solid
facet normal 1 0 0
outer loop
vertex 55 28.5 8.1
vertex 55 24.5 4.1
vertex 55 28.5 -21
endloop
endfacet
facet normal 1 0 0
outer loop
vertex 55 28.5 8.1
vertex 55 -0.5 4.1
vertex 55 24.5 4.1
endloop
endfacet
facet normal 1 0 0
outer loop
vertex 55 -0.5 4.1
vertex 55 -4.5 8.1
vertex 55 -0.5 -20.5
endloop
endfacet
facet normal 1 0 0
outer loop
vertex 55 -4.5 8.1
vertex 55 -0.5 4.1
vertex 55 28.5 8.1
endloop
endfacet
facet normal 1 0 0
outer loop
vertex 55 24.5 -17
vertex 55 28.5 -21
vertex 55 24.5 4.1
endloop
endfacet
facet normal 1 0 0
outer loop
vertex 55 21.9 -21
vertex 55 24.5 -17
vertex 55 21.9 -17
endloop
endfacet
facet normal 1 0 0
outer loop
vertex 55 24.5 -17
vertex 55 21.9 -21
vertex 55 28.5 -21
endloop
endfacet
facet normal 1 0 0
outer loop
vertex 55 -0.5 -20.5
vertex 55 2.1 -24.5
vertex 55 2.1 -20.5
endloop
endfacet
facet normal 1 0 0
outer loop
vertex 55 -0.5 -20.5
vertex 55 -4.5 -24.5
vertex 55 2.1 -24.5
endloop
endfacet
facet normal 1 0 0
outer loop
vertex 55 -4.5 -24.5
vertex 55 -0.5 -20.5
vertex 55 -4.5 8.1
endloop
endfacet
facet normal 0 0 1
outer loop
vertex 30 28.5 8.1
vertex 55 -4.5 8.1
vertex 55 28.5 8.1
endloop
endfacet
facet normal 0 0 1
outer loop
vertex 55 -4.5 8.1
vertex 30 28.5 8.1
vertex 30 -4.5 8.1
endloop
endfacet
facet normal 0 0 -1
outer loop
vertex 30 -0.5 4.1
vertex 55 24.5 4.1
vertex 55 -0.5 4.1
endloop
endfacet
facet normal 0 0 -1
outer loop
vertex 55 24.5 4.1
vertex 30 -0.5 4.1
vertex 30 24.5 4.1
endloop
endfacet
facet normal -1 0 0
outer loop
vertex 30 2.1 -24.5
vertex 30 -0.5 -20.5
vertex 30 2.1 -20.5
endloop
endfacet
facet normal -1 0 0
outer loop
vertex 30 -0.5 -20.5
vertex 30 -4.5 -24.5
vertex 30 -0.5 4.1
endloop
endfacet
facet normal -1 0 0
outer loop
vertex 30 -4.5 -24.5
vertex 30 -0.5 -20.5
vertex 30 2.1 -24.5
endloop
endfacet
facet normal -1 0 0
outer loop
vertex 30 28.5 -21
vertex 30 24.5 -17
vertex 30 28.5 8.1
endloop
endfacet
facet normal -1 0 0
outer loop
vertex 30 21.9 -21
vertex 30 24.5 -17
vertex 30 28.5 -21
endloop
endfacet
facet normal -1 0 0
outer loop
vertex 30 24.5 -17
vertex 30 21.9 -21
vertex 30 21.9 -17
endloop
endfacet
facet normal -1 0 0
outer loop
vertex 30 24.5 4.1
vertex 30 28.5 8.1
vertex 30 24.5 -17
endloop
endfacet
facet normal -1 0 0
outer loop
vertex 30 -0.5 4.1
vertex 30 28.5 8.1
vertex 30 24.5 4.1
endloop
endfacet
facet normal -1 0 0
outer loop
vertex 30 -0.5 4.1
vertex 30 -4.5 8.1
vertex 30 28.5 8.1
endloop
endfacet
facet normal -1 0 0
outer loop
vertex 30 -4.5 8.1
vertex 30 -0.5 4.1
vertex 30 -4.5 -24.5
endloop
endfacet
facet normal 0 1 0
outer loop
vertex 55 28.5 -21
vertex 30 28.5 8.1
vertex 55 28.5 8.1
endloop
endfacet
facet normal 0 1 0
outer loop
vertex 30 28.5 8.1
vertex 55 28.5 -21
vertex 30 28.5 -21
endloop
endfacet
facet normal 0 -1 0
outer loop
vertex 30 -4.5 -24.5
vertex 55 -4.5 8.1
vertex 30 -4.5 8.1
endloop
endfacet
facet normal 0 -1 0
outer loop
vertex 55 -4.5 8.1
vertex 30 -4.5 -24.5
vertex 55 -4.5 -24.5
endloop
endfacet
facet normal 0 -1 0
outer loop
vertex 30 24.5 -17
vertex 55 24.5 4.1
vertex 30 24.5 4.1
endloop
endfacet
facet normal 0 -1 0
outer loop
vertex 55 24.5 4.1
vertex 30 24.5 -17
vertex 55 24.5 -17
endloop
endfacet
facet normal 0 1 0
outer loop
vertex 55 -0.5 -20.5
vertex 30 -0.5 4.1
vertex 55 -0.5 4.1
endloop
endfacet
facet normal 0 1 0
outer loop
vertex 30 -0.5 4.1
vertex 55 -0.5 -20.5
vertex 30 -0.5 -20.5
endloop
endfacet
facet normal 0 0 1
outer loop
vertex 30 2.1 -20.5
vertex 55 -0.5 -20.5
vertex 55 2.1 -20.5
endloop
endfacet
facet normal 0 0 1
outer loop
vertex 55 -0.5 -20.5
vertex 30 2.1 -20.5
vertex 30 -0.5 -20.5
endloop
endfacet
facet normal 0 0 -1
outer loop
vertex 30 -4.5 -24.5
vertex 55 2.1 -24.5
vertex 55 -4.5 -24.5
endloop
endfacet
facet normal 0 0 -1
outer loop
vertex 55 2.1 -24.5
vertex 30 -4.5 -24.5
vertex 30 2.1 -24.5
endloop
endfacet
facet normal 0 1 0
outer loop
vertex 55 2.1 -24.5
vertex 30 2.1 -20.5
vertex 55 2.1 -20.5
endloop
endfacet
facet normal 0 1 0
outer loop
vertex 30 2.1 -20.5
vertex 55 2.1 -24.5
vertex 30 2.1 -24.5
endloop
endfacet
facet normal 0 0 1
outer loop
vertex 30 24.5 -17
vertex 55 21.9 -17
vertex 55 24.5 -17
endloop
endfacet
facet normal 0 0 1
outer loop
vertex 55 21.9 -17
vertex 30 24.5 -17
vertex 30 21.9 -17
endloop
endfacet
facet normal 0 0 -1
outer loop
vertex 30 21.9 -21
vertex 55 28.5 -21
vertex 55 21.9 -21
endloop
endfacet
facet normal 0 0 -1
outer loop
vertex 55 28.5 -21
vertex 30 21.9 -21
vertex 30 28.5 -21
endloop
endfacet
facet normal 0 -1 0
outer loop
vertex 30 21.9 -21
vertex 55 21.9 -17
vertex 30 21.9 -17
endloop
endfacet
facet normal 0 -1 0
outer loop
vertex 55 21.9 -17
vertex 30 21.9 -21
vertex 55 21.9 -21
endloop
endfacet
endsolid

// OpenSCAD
//###############################################################################
//# ScreenMount - Main Assembly                                                 #
//###############################################################################
//#    Copyright 2021 Dirk Heisswolf                                            #
//#    This file is part of the DiffCaSt project.                               #
//#                                                                             #
//#    This project is free software: you can redistribute it and/or modify     #
//#    it under the terms of the GNU General Public License as published by     #
//#    the Free Software Foundation, either version 3 of the License, or        #
//#    (at your option) any later version.                                      #
//#                                                                             #
//#    This project is distributed in the hope that it will be useful,          #
//#    but WITHOUT ANY WARRANTY; without even the implied warranty of           #
//#    MERCHANTABILITY or FITNESS FOR A PARTICULAR PURPOSE.  See the            #
//#    GNU General Public License for more details.                             #
//#                                                                             #
//#    You should have received a copy of the GNU General Public License        #
//#    along with this project.  If not, see <http://www.gnu.org/licenses/>.    #
//#                                                                             #
//#    This project makes use of the NopSCADlib library                         #
//#    (see https://github.com/nophead/NopSCADlib).                             #
//#                                                                             #
//###############################################################################
//# Description:                                                                #
//#   Screen mount                                                              #
//#                                                                             #
//###############################################################################
//# Version History:                                                            #
//#   September 22, 2021                                                        #
//#      - Initial release                                                      #
//#                                                                             #
//###############################################################################

//Global Parameters
Rod_diameter    = 26;
LProf_height    = 20;
LProf_width     = 20;
LProf_thickness = 1.6;
Wall_thickness  = 2;
Clamp_length    = 25;
Slack           = 1;

//Aluminium L-profile
module LProfile(trans     = [0,0,0], 
                rot       = [0,0,0],
                length    = 100,
                height    = LProf_height,
                width     = LProf_width,
                thickness = LProf_thickness) {
    translate(trans)
    rotate(rot) {
        color("gray") { 
            cube([length,width,thickness]);
            cube([length,thickness,height]);                    
        }            
    }
}

//Rod
module Rod(trans     = [0,0,0], 
           rot       = [0,0,0],
           length    = 100,
           diameter  = Rod_diameter) {
    translate(trans)
    rotate(rot) {
        color("brown") { 
            cylinder(h=length,d=diameter);                
        }            
    }
}

//Rod mount
module RodMount() {
    color("green")
    difference() {
        union() {
           translate([-Wall_thickness,
                      -Wall_thickness,
                      0]) 
           cube([Rod_diameter+(2*Wall_thickness),
                 LProf_width+(2*Wall_thickness),
                 (Rod_diameter/2+Wall_thickness)]);
            
           translate([-Wall_thickness,
                      -Wall_thickness,
                      -LProf_height-Wall_thickness]) 
           cube([Rod_diameter+(2*Wall_thickness),
                 LProf_thickness+(2*Wall_thickness),
                 LProf_height+Wall_thickness]);
            
           translate([-Wall_thickness,
                      -Wall_thickness,
                      -LProf_thickness-Wall_thickness]) 
           cube([Rod_diameter+(2*Wall_thickness),
                 LProf_width+(2*Wall_thickness),
                 LProf_thickness+Wall_thickness]);
        }  
        union() {

            //Lower profile
            LProfile(rot=[270,0,0]);

            //Rod
            Rod(rot=[90,0,0],
                trans=[(Rod_diameter/2),50,(Rod_diameter/2)+Wall_thickness]);
 
        }
    }
} 

//Lower guide
module LowerGuide() {
    color("green")
    difference() {
        union() {
            
           translate([-Wall_thickness,
                      -Wall_thickness,
                      -LProf_height-Wall_thickness]) 
           cube([Clamp_length+(2*Wall_thickness),
                 LProf_thickness+(2*Wall_thickness),
                 LProf_height+Wall_thickness]);
            
           translate([-Wall_thickness,
                      -Wall_thickness,
                      -LProf_thickness-Wall_thickness]) 
           cube([Clamp_length+(2*Wall_thickness),
                 LProf_width+(2*Wall_thickness),
                 LProf_thickness+(2*Wall_thickness)]);

           translate([-Wall_thickness,
                      -Wall_thickness,
                      0]) 
           cube([Clamp_length+(2*Wall_thickness),
                 (2*Wall_thickness),
                 (1.5*LProf_thickness)+(2*Wall_thickness)]);
  
           translate([-Wall_thickness,
                      -Wall_thickness,
                      (1.5*LProf_thickness)+Wall_thickness]) 
           cube([Clamp_length+(2*Wall_thickness),
                 LProf_width+(2*Wall_thickness),
                 (2*Wall_thickness)]);
        
        }  
        union() {

            //Lower profile
            LProfile(rot=[270,0,0]);
 
        }
    }
} 

//Brace
module Brace() {
    color("green")
    union() {
        
       translate([30,
                  -(2*Wall_thickness)-(Slack/2),
                  LProf_thickness+Wall_thickness+(Slack/2)]) 
       cube([Clamp_length,
             LProf_width+(6*Wall_thickness)+Slack,
             (2*Wall_thickness)]);
  
       translate([30,
                  LProf_width+(2*Wall_thickness)+(Slack/2),
                  -LProf_height+LProf_thickness-(1*Wall_thickness)-(Slack/2)]) 
       cube([Clamp_length,
             (2*Wall_thickness),
             LProf_height+(4*Wall_thickness)+Slack]);
  
       translate([30,
                  -(2*Wall_thickness)-(Slack/2),
                  -LProf_height+LProf_thickness-(3*Wall_thickness)]) 
       cube([Clamp_length,
             (2*Wall_thickness),
             LProf_height+(6*Wall_thickness)+(Slack/2)]);

        translate([30,
                  -(2*Wall_thickness)-(Slack/2),
                  -LProf_height-(2*Wall_thickness)-(Slack/2)]) 
        cube([Clamp_length,
              (2*Wall_thickness)+LProf_thickness+Slack,
              (2*Wall_thickness)]);

        translate([30,
                  LProf_width-LProf_thickness+(2*Wall_thickness)-(Slack/2),
                  -LProf_height-Slack]) 
        cube([Clamp_length,
              (2*Wall_thickness)+LProf_thickness+Slack,
              (2*Wall_thickness)]);
        
    }
} 

//Upper guide
module UpperGuide() {
    color("green")
    rotate([0,0,180])
    translate([-100,
               -LProf_width-LProf_thickness-Wall_thickness,
               LProf_thickness+Wall_thickness])
    difference() {
        union() {
            
           translate([-Wall_thickness,
                      -Wall_thickness,
                      -LProf_height-Wall_thickness]) 
           cube([Clamp_length+(2*Wall_thickness),
                 LProf_thickness+(2*Wall_thickness),
                 LProf_height+Wall_thickness]);
            
           translate([-Wall_thickness,
                      -Wall_thickness,
                      -LProf_thickness-Wall_thickness]) 
           cube([Clamp_length+(2*Wall_thickness),
                 LProf_width+(2*Wall_thickness),
                 LProf_thickness+(2*Wall_thickness)]);
  
           translate([-Wall_thickness,
                       Wall_thickness,
                      -(2.5*LProf_thickness)-(3*Wall_thickness)]) 
           cube([Clamp_length+(2*Wall_thickness),
                 LProf_width,
                 (2*Wall_thickness)]);
        
        }  
        union() {

            //Lower profile
            LProfile(rot=[270,0,0]);
 
        }
    }
} 

//Rod mount
//RodMount();
//mirror([0,1,0]) RodMount();

//Lower guide
//LowerGuide();
//mirror([0,1,0]) LowerGuide();

//Upper Guide
//UpperGuide();
//mirror([0,1,0]) UpperGuide();

//Brace
Brace();

//Lower profile
//LProfile(rot=[270,0,0]);

//Upper profile
//LProfile(rot=[180,0,0], 
//         trans=[0,LProf_width+(2*Wall_thickness),Wall_thickness+LProf_thickness]);

//Rod
//Rod(rot=[90,0,0],
//    trans=[(Rod_diameter/2),50,(Rod_diameter/2)+Wall_thickness]);
